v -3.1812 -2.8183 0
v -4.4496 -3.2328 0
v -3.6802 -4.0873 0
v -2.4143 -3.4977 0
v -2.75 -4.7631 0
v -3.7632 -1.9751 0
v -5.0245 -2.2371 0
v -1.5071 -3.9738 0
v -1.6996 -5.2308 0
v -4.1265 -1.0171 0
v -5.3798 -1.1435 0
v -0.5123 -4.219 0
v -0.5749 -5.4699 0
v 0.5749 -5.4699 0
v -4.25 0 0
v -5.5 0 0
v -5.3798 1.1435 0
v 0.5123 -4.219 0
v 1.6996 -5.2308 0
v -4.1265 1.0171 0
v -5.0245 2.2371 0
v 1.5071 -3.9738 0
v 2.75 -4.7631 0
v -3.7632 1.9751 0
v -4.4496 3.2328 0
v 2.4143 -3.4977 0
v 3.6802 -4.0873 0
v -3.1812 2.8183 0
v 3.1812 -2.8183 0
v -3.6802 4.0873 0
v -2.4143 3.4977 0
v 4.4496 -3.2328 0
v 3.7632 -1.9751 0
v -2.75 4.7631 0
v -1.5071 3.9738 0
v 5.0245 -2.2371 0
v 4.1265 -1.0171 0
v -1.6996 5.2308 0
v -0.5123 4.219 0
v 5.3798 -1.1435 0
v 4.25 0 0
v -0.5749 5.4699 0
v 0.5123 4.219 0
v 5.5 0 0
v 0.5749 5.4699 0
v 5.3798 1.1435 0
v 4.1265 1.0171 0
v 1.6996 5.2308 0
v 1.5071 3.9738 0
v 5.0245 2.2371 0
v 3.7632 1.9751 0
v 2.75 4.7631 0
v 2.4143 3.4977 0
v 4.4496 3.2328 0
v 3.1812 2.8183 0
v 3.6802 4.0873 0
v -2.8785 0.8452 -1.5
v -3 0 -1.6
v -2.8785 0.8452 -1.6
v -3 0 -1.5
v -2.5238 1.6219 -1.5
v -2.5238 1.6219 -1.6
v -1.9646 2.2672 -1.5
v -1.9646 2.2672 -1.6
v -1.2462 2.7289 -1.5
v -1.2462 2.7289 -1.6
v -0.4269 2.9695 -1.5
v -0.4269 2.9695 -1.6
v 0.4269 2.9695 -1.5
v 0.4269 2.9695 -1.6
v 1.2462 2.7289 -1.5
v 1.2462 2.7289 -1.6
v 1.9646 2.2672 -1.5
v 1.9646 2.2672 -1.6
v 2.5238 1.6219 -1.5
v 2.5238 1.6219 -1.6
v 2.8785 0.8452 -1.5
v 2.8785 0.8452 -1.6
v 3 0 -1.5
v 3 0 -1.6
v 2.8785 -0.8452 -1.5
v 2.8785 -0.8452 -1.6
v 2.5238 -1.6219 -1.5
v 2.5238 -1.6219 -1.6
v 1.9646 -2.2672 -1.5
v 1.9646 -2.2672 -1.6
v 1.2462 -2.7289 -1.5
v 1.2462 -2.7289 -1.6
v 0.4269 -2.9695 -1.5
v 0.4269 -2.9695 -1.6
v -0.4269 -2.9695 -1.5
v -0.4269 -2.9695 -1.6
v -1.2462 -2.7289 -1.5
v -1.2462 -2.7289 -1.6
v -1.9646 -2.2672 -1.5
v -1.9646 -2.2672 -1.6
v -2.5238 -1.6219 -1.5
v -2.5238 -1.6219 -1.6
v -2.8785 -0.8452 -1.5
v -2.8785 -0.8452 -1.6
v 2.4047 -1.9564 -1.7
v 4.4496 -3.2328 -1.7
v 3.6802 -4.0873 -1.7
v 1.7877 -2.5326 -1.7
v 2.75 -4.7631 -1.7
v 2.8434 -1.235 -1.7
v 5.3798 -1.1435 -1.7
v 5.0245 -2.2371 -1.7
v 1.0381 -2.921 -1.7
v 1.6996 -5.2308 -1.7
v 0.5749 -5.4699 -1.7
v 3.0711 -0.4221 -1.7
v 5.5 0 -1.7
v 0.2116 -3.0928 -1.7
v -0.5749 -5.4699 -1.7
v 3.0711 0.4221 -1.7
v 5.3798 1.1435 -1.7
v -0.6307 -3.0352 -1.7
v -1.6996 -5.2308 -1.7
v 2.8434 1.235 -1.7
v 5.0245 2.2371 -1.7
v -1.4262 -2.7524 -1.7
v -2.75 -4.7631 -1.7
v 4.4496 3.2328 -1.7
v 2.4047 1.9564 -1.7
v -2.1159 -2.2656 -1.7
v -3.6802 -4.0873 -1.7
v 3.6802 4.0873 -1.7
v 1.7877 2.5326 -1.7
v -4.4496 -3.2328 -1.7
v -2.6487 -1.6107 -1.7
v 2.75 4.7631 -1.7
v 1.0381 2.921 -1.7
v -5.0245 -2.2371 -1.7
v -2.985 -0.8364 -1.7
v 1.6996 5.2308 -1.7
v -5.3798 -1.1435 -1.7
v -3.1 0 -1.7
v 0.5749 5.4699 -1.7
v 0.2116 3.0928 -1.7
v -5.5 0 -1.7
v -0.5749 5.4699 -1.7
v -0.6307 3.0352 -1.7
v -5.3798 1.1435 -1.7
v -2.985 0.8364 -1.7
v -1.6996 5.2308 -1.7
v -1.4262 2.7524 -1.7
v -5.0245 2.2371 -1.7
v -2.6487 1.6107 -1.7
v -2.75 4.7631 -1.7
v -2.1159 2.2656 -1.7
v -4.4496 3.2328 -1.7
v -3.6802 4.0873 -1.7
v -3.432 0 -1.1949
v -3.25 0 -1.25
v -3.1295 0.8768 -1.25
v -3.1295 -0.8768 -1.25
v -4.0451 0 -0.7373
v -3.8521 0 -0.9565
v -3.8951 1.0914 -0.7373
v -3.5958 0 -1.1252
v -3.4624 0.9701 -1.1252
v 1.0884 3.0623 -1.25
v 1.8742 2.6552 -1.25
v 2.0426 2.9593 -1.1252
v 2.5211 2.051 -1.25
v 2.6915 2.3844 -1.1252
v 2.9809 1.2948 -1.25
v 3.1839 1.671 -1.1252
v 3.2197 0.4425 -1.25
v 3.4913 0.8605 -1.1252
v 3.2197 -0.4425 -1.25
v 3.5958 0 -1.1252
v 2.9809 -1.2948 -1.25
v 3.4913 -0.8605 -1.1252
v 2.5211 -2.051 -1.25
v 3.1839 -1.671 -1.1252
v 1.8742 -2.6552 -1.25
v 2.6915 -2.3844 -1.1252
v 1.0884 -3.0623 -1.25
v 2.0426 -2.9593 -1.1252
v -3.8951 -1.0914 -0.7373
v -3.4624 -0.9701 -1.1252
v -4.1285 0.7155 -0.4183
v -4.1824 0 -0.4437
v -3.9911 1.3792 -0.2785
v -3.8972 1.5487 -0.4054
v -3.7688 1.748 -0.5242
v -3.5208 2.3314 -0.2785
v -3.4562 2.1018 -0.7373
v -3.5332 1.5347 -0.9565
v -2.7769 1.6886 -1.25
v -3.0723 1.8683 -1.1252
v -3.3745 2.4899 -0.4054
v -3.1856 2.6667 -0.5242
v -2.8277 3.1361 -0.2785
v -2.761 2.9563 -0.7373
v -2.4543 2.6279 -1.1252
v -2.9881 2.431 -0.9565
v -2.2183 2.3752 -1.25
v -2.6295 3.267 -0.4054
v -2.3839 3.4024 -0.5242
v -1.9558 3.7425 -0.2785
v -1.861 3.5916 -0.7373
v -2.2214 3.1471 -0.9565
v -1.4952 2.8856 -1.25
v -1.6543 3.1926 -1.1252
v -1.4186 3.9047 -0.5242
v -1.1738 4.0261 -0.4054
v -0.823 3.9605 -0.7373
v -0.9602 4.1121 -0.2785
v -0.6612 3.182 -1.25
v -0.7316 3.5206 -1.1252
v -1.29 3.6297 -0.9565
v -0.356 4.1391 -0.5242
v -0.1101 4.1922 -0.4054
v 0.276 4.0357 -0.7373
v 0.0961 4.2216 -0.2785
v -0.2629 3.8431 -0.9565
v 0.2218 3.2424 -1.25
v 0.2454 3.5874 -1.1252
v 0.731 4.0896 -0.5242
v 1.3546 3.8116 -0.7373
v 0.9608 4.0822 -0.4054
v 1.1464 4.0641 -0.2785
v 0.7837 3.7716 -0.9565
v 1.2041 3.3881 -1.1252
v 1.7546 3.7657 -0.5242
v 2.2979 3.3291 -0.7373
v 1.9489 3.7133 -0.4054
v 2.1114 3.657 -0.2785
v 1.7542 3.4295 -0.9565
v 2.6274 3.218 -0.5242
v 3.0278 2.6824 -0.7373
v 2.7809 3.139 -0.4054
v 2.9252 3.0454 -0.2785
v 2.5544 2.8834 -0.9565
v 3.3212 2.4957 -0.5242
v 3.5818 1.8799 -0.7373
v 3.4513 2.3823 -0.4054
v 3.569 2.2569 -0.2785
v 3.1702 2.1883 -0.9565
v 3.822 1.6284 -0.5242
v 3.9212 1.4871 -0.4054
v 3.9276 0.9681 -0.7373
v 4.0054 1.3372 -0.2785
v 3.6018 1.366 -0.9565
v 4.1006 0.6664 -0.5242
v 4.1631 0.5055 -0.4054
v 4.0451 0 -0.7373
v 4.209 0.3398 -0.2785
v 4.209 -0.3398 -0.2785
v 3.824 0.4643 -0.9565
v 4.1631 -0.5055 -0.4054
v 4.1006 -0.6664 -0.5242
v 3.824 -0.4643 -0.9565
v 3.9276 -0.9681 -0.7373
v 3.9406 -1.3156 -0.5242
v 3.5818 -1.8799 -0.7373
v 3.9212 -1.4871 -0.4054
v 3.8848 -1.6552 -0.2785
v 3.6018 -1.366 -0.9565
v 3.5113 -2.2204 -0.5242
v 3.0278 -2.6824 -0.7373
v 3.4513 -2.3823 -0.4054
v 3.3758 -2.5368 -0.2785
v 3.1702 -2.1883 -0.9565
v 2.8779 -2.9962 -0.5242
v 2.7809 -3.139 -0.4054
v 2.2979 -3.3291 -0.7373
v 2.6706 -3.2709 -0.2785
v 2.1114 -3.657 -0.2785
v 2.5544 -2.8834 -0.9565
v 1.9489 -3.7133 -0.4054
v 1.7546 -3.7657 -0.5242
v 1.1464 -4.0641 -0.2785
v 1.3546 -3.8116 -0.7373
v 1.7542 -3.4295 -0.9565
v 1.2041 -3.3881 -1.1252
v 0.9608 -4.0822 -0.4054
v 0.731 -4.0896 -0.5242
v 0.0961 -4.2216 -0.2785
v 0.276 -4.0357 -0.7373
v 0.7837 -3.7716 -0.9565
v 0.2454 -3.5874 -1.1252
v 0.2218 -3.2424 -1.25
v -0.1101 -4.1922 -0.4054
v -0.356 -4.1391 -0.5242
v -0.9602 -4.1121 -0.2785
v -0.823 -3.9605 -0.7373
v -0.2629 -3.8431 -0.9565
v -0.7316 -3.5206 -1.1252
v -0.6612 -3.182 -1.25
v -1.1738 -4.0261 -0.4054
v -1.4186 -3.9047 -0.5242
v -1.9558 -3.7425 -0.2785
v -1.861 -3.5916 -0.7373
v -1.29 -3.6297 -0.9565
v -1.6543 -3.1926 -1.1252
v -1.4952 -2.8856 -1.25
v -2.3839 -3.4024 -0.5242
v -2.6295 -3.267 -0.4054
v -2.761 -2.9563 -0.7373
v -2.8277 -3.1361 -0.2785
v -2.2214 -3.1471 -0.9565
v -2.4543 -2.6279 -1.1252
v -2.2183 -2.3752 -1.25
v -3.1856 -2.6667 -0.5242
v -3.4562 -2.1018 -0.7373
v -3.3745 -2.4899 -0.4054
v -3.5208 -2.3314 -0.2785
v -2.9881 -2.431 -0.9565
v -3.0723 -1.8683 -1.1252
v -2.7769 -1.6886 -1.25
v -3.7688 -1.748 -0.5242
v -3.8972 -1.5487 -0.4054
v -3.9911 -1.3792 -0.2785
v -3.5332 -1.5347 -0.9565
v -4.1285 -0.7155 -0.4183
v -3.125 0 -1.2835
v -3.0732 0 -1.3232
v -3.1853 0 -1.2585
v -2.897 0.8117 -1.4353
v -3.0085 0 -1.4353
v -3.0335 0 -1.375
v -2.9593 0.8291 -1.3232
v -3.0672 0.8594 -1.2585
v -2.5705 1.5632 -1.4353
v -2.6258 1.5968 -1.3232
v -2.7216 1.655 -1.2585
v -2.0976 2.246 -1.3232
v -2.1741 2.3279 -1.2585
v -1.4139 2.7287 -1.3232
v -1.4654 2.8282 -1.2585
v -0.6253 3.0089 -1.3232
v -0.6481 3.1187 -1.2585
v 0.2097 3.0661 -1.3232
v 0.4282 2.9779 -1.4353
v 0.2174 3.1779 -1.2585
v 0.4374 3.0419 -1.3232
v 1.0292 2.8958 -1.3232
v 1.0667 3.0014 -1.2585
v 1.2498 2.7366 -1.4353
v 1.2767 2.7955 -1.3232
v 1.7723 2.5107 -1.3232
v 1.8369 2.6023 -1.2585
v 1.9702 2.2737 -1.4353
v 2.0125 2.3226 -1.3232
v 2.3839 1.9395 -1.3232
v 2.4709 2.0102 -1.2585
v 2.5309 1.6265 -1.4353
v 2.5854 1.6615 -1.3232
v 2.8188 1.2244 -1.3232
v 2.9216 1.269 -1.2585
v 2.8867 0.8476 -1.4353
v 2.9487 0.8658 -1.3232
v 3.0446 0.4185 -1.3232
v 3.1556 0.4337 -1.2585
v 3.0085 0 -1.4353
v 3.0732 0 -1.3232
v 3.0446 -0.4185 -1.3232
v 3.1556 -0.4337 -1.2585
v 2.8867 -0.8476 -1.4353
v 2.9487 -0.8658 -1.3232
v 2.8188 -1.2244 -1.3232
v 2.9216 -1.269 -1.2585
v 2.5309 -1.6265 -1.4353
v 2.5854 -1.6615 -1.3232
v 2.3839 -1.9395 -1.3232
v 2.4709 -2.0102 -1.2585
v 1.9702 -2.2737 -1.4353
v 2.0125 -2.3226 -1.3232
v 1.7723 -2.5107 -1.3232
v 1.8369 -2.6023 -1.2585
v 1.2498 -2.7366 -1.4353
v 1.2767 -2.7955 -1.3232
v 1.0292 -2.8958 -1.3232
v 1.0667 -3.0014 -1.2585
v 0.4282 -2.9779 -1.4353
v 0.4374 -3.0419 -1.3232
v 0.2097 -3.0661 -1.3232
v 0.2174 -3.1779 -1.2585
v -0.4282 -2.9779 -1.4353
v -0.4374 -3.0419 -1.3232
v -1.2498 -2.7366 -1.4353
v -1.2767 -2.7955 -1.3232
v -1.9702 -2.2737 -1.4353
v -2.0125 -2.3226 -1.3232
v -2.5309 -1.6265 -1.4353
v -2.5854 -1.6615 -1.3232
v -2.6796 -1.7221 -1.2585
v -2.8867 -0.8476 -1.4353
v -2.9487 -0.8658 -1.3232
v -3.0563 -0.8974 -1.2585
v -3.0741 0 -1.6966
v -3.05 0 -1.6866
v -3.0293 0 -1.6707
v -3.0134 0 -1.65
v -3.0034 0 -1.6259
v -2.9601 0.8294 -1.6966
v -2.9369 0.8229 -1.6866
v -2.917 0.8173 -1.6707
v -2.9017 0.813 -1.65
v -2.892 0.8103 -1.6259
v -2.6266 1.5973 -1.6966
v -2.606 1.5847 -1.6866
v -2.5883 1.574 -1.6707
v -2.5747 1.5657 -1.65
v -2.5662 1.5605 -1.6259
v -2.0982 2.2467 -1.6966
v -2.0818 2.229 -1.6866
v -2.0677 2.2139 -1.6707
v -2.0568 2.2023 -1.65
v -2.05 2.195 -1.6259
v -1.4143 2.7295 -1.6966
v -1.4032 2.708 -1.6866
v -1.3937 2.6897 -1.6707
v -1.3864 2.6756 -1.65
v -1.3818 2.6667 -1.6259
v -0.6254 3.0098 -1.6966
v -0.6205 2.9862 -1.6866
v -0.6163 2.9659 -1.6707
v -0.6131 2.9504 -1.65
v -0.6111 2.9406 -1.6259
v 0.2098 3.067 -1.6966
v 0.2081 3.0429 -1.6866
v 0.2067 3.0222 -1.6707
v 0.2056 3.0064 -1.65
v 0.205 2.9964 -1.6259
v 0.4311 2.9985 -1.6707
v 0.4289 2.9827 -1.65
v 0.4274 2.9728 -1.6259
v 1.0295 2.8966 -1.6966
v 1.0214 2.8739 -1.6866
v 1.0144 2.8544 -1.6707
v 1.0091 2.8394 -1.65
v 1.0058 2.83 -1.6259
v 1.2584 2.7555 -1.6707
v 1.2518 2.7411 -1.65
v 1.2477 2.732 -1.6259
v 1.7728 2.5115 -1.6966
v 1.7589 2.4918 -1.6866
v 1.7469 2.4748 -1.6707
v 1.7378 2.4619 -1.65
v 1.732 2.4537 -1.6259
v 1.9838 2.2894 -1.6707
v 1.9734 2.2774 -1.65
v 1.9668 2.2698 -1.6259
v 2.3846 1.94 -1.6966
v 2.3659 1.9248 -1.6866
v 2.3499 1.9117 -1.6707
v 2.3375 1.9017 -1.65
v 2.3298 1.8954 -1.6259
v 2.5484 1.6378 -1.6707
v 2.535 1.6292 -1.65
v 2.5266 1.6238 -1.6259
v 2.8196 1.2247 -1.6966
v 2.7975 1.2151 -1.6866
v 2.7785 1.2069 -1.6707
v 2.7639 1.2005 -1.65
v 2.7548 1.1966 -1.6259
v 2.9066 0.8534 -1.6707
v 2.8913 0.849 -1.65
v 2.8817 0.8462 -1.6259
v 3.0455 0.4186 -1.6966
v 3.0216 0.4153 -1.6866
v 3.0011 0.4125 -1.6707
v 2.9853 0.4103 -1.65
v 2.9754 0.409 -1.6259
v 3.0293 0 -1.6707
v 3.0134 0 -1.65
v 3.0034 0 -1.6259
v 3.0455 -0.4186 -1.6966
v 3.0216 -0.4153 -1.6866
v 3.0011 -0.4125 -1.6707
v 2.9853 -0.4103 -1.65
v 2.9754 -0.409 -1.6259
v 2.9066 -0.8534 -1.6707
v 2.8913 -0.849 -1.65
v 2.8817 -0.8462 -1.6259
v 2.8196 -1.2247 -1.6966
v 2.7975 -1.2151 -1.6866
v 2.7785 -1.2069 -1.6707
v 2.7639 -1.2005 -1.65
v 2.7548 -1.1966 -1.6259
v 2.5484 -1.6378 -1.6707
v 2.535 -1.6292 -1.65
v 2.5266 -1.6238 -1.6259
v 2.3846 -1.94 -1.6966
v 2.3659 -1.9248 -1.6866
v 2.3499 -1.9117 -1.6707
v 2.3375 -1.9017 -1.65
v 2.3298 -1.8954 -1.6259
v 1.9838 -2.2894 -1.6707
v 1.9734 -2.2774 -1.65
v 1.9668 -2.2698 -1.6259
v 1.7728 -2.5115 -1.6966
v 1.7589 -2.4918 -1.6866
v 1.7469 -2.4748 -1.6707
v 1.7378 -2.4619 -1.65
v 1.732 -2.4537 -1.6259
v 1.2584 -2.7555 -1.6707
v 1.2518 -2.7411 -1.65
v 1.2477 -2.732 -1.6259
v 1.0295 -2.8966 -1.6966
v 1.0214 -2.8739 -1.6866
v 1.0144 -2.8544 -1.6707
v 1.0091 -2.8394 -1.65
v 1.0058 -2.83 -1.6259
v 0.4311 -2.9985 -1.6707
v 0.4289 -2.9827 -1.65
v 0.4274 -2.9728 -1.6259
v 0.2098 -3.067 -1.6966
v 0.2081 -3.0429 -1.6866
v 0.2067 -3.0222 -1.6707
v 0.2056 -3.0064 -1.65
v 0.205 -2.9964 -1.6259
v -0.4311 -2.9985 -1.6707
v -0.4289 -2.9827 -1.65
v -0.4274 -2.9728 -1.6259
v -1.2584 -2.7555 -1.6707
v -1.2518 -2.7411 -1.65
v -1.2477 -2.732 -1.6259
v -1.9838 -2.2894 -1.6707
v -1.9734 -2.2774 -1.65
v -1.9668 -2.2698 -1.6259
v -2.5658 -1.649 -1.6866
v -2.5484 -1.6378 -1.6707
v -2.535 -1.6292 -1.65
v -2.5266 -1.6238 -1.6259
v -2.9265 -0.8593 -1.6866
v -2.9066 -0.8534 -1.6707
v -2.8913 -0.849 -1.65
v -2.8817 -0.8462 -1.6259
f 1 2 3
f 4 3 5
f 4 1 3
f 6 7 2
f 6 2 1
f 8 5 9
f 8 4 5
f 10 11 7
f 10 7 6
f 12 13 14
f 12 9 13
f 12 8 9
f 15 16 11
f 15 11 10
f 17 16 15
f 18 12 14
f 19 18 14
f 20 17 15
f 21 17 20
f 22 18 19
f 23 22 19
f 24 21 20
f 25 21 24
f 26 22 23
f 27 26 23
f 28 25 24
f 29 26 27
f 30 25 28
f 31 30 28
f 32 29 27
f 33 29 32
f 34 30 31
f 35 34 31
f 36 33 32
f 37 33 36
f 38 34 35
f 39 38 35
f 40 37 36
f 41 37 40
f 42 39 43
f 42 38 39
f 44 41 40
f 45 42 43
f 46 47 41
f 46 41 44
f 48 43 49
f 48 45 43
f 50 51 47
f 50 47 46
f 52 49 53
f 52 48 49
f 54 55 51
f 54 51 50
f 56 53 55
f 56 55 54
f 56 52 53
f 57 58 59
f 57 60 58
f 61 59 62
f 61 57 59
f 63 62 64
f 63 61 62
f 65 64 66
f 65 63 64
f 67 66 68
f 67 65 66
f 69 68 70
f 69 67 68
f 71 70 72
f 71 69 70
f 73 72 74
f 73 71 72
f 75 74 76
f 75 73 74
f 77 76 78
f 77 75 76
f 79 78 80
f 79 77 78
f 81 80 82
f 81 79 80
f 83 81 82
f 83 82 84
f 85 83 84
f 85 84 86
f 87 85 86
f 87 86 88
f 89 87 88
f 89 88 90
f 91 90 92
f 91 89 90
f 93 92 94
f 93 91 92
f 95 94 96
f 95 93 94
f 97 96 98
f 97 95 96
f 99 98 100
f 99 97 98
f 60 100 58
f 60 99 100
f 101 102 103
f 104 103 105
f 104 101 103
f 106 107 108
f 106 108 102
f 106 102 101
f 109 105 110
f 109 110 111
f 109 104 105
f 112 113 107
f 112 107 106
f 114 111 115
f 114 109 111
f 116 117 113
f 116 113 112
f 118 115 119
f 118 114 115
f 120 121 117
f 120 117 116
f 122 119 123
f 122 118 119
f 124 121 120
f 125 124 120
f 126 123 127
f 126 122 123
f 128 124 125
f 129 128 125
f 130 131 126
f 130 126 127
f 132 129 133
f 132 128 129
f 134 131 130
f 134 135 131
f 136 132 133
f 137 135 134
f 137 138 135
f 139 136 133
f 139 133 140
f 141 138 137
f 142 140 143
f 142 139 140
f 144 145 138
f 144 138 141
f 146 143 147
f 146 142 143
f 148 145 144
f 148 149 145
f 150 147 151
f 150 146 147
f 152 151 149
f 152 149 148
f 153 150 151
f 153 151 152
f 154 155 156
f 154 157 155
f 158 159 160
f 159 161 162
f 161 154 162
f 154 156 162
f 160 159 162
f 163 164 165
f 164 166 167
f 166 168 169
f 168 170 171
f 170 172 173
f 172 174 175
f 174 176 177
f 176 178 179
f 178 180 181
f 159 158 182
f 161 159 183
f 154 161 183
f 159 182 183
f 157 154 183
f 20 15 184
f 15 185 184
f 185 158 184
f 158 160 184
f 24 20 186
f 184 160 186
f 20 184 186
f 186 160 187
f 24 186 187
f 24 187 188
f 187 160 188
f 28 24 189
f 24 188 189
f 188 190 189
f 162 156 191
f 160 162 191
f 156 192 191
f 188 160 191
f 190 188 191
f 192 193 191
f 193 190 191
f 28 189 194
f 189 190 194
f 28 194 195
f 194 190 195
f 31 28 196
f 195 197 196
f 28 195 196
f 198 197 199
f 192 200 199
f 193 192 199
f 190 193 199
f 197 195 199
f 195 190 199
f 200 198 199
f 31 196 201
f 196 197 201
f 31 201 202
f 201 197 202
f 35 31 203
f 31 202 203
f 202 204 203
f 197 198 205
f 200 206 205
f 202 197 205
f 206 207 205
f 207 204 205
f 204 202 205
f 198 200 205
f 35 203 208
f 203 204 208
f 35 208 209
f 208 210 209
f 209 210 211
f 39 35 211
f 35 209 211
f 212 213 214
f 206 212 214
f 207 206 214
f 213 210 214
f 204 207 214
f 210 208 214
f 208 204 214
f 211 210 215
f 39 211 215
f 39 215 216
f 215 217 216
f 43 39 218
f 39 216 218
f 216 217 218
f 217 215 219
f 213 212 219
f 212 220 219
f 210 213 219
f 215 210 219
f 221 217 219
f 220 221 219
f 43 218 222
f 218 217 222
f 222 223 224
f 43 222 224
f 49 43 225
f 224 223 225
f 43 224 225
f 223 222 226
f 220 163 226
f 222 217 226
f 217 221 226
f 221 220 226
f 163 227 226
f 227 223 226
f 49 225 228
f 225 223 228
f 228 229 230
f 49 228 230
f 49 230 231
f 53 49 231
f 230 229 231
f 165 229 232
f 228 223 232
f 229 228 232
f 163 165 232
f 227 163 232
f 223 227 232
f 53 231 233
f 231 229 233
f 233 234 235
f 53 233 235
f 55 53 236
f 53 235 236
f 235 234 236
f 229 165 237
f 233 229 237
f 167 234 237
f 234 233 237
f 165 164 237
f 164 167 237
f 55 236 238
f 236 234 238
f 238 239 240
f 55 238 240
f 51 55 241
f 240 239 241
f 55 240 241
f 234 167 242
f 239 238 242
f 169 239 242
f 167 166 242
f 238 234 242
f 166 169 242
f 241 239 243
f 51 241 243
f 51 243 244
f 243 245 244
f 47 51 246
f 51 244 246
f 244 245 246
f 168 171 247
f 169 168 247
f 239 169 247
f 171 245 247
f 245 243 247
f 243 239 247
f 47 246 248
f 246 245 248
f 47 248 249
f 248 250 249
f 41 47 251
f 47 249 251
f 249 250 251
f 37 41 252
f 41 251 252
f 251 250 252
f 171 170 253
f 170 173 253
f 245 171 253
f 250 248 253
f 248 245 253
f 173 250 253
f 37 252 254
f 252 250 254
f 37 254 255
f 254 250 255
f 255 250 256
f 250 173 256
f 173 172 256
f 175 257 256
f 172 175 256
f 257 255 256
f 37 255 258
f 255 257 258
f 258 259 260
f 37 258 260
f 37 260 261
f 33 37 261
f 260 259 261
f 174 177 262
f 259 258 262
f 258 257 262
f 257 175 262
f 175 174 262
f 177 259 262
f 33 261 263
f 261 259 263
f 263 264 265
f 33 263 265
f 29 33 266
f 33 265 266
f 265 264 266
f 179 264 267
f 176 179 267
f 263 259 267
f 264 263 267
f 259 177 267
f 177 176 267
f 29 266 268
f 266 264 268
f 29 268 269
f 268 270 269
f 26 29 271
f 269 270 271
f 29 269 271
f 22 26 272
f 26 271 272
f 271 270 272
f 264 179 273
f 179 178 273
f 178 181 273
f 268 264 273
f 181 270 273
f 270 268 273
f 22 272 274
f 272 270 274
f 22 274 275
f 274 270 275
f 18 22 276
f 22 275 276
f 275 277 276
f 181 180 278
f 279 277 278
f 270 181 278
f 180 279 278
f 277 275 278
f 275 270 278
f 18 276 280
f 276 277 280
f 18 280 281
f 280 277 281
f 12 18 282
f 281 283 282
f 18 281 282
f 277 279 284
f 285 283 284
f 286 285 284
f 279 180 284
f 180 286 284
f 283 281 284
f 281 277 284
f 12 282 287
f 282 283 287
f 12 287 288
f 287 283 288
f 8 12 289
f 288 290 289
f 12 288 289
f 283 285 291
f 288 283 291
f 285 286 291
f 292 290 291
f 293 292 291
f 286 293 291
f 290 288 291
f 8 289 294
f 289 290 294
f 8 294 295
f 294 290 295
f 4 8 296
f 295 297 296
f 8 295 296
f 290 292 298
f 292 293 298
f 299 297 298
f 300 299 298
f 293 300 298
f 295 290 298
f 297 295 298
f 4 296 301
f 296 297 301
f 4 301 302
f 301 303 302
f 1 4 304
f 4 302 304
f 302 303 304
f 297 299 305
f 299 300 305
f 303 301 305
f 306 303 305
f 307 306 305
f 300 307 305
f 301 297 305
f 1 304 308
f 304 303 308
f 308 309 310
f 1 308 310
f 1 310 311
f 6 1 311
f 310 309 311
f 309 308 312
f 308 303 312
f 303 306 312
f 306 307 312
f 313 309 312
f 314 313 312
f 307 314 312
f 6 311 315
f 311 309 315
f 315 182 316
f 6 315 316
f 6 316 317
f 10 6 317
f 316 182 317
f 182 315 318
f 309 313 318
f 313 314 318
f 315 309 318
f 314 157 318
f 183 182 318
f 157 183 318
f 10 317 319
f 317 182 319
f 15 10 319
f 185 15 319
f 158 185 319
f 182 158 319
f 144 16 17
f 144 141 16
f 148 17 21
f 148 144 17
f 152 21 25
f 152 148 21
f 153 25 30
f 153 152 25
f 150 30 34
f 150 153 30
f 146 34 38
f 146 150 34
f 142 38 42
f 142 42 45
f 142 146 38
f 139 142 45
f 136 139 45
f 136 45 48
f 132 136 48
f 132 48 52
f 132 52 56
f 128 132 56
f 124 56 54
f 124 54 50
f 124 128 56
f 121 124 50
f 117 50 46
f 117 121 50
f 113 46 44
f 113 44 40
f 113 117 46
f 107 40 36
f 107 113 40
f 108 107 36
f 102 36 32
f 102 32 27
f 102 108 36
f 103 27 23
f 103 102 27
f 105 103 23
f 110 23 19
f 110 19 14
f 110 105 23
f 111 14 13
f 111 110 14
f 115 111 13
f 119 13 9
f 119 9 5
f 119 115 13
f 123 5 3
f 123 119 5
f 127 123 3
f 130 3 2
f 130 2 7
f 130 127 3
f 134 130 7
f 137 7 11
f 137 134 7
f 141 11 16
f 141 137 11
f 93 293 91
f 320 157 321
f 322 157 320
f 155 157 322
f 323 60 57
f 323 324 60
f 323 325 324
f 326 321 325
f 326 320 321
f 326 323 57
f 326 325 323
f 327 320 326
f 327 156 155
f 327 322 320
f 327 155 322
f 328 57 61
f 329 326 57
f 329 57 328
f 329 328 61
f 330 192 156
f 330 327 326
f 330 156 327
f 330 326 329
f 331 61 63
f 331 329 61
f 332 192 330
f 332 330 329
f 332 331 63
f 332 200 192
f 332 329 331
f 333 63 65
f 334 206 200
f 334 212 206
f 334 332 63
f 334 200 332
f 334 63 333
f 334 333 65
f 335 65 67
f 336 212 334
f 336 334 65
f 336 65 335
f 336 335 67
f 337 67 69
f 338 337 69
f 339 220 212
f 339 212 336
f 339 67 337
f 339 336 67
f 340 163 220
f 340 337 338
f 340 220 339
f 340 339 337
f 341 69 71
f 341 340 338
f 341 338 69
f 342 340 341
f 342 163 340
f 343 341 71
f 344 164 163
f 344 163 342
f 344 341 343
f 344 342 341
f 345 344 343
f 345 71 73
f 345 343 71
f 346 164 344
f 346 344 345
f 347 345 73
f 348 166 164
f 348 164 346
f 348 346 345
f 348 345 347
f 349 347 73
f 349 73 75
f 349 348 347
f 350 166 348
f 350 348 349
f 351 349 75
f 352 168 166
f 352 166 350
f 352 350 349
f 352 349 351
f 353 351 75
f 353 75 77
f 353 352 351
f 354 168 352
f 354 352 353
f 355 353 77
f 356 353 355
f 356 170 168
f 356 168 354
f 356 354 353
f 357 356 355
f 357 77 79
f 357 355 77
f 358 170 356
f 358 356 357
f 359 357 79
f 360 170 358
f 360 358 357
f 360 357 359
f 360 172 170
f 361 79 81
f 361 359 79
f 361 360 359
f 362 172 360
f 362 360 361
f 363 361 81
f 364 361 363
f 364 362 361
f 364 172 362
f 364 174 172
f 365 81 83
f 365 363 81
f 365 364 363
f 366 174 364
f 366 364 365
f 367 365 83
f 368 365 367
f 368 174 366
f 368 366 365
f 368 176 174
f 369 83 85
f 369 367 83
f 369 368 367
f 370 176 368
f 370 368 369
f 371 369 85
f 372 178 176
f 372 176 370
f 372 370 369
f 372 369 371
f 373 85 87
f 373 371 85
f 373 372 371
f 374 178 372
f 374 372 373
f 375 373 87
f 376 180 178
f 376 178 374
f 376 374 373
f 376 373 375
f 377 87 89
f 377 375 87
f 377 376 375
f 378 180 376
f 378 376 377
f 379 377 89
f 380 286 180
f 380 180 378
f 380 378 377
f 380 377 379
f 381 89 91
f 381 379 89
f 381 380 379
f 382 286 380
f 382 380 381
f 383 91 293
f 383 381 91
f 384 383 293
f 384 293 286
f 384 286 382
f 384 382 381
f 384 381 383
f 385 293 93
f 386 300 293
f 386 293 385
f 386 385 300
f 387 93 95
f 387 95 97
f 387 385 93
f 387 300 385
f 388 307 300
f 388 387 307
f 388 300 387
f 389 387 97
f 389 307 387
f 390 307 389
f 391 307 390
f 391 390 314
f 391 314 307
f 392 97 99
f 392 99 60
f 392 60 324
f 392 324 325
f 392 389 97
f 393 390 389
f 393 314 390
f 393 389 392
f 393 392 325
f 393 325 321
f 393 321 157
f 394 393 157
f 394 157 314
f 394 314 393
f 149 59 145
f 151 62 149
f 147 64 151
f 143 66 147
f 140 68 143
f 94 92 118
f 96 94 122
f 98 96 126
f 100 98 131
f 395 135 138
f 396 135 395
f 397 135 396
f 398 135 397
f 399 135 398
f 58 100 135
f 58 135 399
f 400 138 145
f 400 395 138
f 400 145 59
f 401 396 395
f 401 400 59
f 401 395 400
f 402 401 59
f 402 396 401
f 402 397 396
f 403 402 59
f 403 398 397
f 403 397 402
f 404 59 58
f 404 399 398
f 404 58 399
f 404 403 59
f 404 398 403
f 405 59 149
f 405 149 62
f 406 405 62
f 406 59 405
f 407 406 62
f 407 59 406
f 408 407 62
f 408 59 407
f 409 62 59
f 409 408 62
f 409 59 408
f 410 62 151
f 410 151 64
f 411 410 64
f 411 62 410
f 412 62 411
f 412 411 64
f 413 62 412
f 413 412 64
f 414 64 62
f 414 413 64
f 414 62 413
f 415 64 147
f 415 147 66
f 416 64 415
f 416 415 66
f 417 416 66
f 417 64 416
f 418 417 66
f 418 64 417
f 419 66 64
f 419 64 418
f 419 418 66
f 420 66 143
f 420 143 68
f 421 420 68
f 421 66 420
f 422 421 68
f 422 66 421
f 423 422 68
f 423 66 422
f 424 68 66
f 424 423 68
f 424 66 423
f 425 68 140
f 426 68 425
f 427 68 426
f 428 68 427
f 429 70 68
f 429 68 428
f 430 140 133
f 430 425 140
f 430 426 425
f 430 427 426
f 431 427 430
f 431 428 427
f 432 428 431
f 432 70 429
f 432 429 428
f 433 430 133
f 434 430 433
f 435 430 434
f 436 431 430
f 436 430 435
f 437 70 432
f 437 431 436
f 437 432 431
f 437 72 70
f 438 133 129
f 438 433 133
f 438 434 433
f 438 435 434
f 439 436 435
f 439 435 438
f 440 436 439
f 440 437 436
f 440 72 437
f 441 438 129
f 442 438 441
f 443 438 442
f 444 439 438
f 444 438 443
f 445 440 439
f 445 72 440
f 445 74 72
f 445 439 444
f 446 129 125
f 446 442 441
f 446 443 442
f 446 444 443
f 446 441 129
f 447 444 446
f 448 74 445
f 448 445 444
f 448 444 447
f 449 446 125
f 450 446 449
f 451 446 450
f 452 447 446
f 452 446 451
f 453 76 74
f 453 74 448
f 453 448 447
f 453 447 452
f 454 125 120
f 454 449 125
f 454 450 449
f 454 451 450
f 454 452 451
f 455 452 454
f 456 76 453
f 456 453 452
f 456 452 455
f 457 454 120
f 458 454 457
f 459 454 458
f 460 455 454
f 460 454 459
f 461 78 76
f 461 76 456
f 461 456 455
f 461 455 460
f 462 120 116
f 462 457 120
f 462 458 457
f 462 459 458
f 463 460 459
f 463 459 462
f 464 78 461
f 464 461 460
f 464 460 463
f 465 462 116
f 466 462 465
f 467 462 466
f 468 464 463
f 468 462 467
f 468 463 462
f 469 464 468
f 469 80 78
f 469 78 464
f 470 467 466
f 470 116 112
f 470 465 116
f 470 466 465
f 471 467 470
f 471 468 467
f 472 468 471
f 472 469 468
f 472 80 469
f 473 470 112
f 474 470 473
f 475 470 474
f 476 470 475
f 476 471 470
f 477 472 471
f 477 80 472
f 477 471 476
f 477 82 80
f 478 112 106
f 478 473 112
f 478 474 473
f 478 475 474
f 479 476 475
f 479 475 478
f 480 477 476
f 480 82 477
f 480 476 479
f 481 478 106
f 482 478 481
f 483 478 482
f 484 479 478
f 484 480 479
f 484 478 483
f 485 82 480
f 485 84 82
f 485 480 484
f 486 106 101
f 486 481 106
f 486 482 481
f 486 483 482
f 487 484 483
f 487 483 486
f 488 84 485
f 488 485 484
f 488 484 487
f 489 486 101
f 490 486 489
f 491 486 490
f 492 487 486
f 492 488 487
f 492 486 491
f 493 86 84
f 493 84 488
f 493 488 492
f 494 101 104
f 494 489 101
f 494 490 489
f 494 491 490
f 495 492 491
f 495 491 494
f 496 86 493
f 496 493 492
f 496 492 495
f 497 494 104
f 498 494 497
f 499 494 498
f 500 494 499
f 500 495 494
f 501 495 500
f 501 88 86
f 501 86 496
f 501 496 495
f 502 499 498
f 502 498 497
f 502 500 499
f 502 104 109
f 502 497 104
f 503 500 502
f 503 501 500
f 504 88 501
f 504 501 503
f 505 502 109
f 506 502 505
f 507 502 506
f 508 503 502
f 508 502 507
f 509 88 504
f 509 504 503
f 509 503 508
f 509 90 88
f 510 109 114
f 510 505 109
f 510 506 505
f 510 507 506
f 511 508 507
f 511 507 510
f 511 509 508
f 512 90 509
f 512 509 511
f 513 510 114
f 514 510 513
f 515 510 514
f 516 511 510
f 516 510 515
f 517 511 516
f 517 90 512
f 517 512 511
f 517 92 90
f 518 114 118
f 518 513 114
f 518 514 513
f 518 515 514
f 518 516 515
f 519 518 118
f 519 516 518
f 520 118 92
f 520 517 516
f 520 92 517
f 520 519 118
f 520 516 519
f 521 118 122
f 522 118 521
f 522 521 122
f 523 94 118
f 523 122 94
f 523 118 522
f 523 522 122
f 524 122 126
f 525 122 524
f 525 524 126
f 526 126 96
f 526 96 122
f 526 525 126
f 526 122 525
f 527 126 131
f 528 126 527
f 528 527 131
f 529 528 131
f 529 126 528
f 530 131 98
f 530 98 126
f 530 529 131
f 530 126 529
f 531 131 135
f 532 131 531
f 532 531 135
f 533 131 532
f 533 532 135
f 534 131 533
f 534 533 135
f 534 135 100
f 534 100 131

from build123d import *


with BuildPart() as part:
    # Sketch2 → Revolve1 (revolve)
    with BuildSketch(Plane(origin=(0, 0, 0), x_dir=(1, 0, 0), z_dir=(0, 1, 0))):
        with BuildLine():
            Line((-5.5, 0), (-5.5, 1.7))
            Line((-5.5, 1.7), (-3.1, 1.7))
            ThreePointArc((-3.1, 1.7), (-3.029289322, 1.670710678), (-3, 1.6))
            Line((-3, 1.6), (-3, 1.5))
            ThreePointArc((-3, 1.5), (-3.073223305, 1.323223305), (-3.25, 1.25))
            add(Edge.make_bspline(
                [(-4.25, 0), (-4.226841552, 1.005477645), (-3.25, 1.25)],
                knots=[0, 0, 0, 1, 1, 1], degree=2))
            Line((-4.25, 0), (-5.5, 0))
        make_face()
    revolve(axis=Axis((0, 0, 0), (0, 0, -1)))


solid = part.part
